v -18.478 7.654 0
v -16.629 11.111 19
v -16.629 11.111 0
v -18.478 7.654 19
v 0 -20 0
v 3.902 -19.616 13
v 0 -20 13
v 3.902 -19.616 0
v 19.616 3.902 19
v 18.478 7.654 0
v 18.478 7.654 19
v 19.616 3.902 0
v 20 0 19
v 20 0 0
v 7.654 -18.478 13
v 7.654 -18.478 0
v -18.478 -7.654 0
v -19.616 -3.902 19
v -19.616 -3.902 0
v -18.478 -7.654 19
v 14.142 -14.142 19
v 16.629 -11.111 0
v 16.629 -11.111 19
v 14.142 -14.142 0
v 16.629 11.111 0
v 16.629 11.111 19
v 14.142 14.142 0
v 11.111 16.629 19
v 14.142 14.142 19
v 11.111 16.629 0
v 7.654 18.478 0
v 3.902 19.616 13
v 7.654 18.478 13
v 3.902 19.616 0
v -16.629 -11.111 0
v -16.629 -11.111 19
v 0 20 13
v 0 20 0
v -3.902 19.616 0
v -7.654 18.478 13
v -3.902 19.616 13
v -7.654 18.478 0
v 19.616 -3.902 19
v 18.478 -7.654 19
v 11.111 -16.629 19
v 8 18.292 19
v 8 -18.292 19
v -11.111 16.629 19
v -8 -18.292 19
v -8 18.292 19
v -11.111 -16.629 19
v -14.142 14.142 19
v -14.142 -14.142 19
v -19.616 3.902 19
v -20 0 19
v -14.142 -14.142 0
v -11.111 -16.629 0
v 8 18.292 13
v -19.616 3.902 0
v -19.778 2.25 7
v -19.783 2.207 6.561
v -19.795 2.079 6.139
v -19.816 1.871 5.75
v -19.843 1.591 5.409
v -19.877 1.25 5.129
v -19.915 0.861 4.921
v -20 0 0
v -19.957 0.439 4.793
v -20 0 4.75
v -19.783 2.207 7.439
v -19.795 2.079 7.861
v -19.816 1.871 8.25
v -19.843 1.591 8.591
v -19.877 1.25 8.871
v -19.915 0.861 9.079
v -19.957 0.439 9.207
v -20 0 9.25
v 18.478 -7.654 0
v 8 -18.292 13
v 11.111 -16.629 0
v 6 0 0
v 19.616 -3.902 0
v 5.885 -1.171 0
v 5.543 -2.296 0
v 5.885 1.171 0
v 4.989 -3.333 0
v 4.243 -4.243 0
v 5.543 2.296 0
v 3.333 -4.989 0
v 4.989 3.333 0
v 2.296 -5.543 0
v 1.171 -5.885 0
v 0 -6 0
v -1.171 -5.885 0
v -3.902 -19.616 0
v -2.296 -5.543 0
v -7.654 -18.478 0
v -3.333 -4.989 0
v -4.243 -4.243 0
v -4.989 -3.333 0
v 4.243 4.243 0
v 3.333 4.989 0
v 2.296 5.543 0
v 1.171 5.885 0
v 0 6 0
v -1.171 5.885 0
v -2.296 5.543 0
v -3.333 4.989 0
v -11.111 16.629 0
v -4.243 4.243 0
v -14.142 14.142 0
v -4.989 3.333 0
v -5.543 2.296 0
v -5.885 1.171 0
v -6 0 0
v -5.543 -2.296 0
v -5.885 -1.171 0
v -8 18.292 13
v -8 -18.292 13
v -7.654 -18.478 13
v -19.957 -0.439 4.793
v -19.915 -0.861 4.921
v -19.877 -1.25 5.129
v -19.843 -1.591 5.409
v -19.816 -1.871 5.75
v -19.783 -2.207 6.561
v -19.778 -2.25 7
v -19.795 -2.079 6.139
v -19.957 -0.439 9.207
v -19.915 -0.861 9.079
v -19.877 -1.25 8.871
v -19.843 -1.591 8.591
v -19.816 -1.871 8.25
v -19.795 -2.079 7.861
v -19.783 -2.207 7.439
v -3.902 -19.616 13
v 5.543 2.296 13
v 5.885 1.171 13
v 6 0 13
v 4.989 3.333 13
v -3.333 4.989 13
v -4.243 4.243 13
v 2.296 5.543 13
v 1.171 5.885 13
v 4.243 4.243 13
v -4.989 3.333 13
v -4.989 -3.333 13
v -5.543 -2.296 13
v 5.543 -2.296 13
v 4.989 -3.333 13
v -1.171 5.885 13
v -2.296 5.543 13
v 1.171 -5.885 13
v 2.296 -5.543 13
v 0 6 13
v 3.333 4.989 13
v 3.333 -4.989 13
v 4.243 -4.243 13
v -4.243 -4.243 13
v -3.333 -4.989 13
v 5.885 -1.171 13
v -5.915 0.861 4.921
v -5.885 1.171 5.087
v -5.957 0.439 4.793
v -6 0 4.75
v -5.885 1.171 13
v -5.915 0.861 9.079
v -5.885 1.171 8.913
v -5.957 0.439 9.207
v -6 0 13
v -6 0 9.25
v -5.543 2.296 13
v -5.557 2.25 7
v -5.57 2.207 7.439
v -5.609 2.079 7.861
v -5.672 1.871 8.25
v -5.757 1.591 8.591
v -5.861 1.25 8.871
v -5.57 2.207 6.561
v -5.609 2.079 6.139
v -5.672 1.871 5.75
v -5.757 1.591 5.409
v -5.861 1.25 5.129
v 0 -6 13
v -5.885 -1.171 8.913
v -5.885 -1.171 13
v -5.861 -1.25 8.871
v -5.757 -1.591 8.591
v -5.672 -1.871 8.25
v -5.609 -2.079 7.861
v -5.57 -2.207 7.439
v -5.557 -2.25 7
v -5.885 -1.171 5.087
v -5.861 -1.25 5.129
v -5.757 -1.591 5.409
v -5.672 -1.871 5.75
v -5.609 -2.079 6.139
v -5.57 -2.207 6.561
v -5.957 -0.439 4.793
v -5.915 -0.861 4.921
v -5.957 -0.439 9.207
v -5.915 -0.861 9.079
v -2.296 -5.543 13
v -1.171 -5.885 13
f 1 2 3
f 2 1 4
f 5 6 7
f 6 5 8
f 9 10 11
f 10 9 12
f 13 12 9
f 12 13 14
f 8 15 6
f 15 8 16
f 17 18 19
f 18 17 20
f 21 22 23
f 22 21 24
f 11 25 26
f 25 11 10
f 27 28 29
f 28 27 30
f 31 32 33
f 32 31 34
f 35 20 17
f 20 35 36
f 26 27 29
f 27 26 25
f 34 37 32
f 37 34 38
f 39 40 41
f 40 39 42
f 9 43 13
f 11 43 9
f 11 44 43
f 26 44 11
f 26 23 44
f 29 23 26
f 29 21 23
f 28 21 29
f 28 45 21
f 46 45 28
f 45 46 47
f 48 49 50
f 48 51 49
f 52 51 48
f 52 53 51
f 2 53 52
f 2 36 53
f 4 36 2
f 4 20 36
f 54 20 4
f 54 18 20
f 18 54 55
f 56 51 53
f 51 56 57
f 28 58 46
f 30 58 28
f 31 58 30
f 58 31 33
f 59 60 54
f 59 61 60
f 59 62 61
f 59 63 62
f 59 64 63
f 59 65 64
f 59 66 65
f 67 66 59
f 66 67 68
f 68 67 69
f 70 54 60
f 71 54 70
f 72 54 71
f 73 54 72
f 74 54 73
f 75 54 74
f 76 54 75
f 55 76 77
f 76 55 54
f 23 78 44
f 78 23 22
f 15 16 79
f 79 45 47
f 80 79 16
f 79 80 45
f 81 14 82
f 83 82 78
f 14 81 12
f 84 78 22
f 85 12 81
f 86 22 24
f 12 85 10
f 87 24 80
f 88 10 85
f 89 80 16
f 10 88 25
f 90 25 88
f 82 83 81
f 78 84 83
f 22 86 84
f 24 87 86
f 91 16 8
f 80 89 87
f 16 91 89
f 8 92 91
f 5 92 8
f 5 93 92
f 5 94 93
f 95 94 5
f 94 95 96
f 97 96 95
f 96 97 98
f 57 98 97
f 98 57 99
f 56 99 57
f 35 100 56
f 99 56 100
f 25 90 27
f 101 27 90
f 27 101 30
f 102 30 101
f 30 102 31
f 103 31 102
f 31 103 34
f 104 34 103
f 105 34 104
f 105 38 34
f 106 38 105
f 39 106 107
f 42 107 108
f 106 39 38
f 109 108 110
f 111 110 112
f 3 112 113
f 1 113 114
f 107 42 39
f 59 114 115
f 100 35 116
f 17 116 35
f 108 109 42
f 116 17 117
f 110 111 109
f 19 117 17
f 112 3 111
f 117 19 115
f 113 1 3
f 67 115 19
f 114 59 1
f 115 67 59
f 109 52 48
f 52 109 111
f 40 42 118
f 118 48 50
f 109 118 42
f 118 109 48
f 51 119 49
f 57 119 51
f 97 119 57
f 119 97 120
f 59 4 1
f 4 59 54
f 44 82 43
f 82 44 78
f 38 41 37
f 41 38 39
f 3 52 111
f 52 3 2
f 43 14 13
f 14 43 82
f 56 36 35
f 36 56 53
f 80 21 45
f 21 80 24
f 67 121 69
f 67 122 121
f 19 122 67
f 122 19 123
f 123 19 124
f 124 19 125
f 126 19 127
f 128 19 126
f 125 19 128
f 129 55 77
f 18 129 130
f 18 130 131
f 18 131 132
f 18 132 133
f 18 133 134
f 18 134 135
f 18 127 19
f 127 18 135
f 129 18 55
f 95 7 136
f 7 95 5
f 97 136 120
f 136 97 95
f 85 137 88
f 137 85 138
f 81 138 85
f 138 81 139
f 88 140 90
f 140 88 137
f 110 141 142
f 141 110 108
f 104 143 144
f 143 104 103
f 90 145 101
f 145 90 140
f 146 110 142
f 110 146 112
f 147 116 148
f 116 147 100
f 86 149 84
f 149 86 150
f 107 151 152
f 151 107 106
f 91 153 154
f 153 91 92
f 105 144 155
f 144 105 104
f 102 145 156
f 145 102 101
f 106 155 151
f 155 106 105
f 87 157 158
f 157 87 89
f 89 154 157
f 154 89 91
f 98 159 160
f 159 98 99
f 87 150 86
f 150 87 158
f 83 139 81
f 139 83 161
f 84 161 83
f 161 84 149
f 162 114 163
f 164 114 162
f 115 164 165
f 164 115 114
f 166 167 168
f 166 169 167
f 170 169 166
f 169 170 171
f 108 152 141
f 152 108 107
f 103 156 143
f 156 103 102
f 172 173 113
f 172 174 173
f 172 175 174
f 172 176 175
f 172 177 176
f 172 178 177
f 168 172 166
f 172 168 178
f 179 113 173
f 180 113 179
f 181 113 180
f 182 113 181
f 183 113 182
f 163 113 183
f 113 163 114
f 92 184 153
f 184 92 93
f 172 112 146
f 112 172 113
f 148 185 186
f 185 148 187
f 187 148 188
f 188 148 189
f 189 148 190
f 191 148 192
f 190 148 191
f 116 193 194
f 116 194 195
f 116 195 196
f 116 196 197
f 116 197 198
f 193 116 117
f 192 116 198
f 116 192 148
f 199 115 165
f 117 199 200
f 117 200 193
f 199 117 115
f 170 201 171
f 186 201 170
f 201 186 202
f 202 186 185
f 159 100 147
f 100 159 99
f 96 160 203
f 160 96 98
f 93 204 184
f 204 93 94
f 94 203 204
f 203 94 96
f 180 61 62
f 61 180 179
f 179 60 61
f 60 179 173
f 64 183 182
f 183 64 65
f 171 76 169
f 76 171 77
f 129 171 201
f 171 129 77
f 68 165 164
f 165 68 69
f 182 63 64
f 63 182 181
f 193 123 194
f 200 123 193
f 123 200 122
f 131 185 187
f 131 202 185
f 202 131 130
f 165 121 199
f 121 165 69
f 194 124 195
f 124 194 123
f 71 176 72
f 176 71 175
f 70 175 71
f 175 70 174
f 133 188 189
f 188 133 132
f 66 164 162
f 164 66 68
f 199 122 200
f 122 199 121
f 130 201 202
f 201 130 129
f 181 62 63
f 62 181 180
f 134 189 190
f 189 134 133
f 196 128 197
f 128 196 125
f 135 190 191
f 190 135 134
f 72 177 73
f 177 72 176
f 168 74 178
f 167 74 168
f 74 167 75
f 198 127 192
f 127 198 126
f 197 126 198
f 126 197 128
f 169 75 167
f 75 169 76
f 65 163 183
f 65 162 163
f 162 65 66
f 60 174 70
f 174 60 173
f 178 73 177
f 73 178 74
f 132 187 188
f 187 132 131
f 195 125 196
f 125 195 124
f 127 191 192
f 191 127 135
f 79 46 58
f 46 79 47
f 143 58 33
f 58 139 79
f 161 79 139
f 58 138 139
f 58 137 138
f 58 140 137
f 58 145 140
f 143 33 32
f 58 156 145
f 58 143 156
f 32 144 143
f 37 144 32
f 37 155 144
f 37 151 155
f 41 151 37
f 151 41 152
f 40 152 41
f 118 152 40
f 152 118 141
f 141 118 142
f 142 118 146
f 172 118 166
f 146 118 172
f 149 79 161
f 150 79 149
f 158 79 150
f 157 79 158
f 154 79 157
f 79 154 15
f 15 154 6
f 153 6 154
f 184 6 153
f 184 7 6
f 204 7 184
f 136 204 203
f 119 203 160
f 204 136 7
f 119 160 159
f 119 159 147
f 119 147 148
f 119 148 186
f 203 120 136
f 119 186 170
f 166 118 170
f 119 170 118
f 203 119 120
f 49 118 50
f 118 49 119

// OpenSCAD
$fn = 32;

// ----------------------------------------------------------------------
// Oldham coupling hub: 40 x 19 mm
// ----------------------------------------------------------------------

// --- parameters (mm) ---
hub_d = 40;               // hub diameter
hub_l = 14;               // hub length
bore_d = 12;              // shaft bore
tongue_w = 16;            // drive tongue width
tongue_h = 5;             // drive tongue height
set_d = 4.5;              // set screw tap hole

module hub() {
  /* the slot side is a raised disc with a groove milled across it */
  cylinder(h = hub_l + tongue_h, d = hub_d);
}

difference() {
  hub();
  translate([0, 0, -1]) cylinder(h = hub_l + tongue_h + 2, d = bore_d);
  translate([-hub_d / 2 - 1, 0, hub_l * 0.5])
    rotate([0, 90, 0]) cylinder(h = hub_d / 2 + 2, d = set_d);
  translate([-tongue_w / 2, -hub_d / 2 - 1, hub_l - 1])
    cube([tongue_w, hub_d + 2, tongue_h + 1]);
}
